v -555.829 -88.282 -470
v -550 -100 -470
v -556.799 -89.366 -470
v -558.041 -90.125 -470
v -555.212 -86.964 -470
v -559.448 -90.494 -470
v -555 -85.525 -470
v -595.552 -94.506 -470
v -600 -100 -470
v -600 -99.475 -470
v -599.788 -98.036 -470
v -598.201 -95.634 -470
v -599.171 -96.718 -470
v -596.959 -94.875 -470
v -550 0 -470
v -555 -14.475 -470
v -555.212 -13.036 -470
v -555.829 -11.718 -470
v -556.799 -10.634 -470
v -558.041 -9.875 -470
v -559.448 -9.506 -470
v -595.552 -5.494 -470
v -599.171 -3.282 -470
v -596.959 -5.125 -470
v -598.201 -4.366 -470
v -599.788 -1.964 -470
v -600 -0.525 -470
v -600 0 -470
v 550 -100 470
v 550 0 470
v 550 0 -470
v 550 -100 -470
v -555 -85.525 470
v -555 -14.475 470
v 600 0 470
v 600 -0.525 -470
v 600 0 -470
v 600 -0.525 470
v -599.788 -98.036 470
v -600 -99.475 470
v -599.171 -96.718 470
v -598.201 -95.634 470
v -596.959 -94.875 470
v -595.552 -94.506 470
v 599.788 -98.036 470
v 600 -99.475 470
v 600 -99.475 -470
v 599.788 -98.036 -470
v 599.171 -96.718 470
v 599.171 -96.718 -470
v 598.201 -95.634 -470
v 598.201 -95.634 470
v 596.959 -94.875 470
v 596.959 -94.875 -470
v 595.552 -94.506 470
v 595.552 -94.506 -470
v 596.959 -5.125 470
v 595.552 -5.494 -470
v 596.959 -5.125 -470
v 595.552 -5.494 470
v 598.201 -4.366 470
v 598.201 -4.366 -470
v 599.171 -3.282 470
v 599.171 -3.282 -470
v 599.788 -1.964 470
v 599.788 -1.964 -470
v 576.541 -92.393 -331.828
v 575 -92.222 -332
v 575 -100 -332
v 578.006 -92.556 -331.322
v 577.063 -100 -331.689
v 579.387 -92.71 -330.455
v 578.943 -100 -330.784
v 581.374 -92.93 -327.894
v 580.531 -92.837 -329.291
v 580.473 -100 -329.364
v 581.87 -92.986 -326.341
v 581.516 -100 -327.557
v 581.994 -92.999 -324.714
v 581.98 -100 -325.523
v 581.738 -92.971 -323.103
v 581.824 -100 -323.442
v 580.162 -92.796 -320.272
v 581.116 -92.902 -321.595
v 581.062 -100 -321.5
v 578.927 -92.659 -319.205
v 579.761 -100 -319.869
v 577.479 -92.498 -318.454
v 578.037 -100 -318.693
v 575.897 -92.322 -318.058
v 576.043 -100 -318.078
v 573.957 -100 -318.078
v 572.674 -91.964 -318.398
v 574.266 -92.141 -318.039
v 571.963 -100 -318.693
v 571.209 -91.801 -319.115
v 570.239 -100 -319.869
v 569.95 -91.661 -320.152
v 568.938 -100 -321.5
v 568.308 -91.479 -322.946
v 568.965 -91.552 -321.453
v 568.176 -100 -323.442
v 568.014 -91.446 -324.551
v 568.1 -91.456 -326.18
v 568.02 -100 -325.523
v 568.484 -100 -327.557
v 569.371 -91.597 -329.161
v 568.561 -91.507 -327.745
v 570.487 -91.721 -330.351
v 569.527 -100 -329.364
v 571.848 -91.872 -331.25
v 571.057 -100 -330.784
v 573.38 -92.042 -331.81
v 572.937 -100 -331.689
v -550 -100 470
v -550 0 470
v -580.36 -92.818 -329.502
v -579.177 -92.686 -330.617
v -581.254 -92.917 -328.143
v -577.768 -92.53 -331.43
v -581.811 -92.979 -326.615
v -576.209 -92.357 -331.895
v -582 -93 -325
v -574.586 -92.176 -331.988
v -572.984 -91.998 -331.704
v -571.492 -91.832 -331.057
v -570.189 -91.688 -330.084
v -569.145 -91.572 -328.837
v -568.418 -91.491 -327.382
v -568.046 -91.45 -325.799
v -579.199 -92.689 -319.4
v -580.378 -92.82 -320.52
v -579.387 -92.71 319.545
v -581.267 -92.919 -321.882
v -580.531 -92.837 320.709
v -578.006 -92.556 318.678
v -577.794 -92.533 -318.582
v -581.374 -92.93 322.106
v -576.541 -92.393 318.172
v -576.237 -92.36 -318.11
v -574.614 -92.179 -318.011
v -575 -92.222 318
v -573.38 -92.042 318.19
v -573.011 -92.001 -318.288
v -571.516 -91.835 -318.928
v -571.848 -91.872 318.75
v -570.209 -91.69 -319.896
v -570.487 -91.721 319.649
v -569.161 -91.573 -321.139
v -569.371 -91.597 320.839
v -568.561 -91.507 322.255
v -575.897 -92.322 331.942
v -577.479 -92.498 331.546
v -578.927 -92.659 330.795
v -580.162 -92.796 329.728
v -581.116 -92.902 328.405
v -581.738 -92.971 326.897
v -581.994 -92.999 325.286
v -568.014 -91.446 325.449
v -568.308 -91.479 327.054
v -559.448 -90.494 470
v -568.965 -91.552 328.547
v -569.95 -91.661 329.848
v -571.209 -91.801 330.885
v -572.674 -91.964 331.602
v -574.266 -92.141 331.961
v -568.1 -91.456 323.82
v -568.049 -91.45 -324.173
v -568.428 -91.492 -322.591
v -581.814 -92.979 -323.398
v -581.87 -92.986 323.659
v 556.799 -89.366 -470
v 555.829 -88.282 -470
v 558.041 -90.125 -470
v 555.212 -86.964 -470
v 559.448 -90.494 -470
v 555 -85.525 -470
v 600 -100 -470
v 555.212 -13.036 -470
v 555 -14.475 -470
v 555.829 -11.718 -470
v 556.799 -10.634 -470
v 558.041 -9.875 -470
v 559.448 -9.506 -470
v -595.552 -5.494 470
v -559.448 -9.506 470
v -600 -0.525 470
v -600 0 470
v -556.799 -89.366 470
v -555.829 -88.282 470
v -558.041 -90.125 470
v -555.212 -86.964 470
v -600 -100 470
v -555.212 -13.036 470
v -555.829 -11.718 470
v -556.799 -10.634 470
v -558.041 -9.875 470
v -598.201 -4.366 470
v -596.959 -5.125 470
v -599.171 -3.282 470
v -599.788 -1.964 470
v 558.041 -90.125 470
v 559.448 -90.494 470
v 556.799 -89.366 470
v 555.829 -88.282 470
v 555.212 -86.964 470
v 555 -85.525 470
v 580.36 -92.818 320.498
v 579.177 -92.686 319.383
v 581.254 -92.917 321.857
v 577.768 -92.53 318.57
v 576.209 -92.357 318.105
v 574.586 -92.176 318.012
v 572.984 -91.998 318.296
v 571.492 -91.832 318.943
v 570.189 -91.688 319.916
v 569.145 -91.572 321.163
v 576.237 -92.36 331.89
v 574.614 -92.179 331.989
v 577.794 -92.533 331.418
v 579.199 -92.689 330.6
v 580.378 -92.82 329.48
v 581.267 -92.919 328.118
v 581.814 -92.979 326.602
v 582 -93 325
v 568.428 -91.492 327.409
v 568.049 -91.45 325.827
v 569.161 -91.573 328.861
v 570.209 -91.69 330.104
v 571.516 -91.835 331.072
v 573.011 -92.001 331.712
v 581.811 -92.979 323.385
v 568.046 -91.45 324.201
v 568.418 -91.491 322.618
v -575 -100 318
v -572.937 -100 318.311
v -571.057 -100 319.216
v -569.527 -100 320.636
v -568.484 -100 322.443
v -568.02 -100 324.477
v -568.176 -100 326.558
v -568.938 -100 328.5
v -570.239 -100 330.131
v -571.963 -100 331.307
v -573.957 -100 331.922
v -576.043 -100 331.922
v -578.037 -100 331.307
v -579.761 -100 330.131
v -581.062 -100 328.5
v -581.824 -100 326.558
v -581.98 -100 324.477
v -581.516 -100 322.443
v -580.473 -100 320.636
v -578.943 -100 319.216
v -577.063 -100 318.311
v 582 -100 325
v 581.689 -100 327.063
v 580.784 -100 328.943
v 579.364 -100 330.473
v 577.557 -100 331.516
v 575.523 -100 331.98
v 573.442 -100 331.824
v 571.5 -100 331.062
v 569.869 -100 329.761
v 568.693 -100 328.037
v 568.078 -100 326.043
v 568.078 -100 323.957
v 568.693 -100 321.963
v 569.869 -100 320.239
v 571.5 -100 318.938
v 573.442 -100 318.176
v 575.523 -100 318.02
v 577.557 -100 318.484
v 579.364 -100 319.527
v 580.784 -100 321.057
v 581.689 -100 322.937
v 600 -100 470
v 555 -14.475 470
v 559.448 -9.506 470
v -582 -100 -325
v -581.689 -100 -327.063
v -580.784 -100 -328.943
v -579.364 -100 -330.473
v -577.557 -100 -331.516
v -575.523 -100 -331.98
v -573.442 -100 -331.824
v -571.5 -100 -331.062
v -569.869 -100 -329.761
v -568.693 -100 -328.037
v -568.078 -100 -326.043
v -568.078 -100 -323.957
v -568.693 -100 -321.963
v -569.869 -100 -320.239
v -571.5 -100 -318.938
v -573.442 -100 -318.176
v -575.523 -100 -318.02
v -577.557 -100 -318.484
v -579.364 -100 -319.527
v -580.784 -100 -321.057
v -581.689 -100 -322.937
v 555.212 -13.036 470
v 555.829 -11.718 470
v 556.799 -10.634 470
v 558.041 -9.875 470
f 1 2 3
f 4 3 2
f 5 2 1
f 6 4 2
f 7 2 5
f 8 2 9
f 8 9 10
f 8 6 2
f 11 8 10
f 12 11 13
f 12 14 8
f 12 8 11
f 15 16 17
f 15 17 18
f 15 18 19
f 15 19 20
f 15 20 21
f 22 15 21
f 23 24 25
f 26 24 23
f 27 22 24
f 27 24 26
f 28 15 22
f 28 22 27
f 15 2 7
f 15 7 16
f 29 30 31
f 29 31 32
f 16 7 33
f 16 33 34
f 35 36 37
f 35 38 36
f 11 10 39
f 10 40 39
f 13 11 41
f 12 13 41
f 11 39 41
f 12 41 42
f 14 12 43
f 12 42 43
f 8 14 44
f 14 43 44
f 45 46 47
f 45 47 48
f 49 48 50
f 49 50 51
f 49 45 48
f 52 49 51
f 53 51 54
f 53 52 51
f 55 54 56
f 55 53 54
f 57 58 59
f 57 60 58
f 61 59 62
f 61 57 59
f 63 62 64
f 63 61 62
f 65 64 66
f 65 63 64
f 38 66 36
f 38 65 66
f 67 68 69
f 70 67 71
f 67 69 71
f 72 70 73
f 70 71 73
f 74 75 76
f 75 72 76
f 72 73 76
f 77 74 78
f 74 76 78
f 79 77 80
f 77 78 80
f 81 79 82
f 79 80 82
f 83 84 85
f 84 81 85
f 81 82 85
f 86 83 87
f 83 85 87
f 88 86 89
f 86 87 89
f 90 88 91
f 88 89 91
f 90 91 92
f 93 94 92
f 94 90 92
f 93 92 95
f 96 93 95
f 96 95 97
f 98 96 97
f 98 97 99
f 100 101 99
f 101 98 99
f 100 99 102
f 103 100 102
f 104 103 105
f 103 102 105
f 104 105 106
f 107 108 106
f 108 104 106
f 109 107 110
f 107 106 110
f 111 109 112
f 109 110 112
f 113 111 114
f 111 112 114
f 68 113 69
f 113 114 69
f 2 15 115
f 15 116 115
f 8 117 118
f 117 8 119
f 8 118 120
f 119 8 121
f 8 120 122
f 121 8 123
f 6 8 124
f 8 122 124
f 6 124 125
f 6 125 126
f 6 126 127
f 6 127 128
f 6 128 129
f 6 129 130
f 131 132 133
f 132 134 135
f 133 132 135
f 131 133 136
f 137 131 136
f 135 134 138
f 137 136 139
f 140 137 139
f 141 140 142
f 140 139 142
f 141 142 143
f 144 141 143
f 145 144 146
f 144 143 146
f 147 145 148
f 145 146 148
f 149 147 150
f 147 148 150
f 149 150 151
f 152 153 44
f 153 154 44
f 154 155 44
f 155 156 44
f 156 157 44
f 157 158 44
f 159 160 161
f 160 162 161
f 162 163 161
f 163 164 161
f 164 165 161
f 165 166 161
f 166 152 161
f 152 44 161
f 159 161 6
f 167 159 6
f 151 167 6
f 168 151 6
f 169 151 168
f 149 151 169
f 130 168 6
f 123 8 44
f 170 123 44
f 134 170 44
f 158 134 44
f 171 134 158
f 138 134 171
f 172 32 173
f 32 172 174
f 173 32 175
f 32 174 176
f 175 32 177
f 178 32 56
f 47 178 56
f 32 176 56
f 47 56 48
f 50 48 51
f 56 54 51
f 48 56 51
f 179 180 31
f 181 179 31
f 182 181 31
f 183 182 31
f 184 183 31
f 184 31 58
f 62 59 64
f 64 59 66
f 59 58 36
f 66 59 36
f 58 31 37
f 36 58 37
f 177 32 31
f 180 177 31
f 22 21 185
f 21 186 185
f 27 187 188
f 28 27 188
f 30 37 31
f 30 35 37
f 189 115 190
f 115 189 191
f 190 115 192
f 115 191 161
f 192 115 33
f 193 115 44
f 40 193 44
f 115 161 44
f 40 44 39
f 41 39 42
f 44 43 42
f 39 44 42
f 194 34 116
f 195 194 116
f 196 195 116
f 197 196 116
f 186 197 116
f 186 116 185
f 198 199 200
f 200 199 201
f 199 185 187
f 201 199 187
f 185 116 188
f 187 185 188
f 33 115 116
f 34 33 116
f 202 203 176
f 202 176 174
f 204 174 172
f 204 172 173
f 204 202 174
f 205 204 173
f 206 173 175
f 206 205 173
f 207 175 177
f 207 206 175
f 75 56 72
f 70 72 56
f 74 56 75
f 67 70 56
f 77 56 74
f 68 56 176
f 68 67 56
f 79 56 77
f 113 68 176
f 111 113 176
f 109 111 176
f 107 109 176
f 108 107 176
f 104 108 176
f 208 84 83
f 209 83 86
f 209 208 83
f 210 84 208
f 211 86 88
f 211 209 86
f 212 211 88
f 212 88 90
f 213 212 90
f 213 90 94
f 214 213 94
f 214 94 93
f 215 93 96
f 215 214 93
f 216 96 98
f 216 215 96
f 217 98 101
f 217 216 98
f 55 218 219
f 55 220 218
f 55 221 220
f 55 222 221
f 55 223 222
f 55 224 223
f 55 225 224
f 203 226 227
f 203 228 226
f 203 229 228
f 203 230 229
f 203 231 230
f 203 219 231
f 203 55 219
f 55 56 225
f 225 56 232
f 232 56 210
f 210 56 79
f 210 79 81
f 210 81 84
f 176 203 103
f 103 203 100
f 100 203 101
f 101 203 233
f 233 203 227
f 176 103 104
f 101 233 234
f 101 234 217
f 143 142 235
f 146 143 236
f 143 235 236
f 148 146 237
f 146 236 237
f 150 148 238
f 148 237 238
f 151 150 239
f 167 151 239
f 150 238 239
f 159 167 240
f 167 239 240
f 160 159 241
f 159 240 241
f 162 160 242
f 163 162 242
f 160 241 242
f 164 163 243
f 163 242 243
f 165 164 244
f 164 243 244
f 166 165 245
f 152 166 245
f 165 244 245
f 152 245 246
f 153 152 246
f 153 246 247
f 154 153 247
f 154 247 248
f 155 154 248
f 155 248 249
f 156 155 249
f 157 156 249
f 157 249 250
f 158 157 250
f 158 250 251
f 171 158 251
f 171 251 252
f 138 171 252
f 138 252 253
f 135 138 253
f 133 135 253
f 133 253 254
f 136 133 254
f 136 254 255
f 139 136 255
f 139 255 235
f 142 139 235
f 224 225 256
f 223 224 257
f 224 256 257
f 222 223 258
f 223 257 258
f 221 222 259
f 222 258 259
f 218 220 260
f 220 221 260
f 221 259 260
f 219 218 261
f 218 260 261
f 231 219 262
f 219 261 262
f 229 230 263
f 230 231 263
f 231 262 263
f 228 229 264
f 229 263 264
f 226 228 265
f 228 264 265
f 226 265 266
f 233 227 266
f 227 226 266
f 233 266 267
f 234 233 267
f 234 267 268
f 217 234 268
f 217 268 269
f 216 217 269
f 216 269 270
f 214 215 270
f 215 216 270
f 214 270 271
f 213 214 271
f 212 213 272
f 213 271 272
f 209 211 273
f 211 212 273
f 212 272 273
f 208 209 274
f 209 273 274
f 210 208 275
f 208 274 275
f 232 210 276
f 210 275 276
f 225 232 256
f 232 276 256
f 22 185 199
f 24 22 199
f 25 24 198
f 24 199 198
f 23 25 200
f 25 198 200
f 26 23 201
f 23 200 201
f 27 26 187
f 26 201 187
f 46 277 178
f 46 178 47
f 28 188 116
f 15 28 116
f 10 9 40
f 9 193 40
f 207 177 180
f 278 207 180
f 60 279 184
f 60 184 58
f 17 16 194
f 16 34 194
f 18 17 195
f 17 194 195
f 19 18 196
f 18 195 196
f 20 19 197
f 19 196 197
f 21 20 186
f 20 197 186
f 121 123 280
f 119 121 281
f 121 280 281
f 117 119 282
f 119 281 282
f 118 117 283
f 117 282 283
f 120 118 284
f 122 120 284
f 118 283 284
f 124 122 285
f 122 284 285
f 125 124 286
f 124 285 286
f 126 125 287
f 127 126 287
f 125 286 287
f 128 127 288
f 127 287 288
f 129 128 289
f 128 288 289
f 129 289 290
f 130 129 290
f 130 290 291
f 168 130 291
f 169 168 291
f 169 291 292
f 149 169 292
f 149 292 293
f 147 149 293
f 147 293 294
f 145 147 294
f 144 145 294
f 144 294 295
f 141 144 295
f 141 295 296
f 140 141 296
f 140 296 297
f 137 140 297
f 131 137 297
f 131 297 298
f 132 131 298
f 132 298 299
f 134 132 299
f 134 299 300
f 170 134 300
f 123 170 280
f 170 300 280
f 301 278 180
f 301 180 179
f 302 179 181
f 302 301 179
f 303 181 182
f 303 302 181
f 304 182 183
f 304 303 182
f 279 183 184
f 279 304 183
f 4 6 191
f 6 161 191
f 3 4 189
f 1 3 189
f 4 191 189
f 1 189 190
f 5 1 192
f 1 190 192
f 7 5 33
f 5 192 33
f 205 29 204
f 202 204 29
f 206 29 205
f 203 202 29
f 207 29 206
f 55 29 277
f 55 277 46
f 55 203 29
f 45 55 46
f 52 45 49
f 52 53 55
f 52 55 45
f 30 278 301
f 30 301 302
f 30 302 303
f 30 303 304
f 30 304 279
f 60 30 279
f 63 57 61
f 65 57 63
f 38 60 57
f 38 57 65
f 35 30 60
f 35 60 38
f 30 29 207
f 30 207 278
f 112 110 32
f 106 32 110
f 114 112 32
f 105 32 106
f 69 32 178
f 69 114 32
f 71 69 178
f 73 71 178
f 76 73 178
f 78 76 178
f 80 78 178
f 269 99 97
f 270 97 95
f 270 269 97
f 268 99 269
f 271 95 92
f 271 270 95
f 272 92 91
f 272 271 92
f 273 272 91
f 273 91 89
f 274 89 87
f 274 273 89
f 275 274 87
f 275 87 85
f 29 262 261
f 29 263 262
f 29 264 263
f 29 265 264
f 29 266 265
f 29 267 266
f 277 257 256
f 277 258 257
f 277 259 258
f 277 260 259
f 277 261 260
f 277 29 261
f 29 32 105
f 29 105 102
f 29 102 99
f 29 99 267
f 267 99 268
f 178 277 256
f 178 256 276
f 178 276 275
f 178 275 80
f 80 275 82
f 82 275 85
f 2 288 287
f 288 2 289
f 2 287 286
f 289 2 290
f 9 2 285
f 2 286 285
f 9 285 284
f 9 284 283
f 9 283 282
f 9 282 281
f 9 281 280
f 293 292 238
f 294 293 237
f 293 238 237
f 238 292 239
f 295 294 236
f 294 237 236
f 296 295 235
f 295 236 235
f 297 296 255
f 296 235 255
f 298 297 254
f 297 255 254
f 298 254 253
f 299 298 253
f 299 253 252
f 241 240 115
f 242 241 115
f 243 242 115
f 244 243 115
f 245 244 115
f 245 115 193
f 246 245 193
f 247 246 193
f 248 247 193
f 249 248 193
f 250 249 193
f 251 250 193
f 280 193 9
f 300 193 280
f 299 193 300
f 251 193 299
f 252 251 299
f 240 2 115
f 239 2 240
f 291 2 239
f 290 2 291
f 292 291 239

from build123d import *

# Parameters (mm, degrees)
BOSS_EXTRUDE1_DEPTH   = 470
BOSS_EXTRUDE1_2_DEPTH = 470
SKETCH2_R             = 7
CUT_EXTRUDE1_DEPTH    = 10


with BuildPart() as part:
    # Sketch1 → Boss-Extrude1 (new, symmetric)
    with BuildSketch(Plane.XY):
        with BuildLine():
            Line((-600, 0), (-550, 0))
            Line((-550, 0), (-550, -100))
            Line((-550, -100), (-600, -100))
            Line((-600, -100), (-600, -99.475213966))
            ThreePointArc((-600, -99.475213966), (-598.725640089, -96.140606654), (-595.55215763, -94.505795292))
            Line((-595.55215763, -94.505795292), (-559.44784237, -90.494204708))
            ThreePointArc((-559.44784237, -90.494204708), (-556.274359911, -88.859393346), (-555, -85.524786034))
            Line((-555, -85.524786034), (-555, -14.475213966))
            ThreePointArc((-555, -14.475213966), (-556.274359911, -11.140606654), (-559.44784237, -9.505795292))
            Line((-559.44784237, -9.505795292), (-595.55215763, -5.494204708))
            ThreePointArc((-595.55215763, -5.494204708), (-598.725640089, -3.859393346), (-600, -0.524786034))
            Line((-600, -0.524786034), (-600, 0))
        make_face()
    extrude(amount=BOSS_EXTRUDE1_DEPTH, both=True)


with BuildPart() as body_2:
    # Sketch1 → Boss-Extrude1 2 (new, symmetric)
    with BuildSketch(Plane.XY):
        with BuildLine():
            Line((600, 0), (550, 0))
            Line((550, 0), (550, -100))
            Line((550, -100), (600, -100))
            Line((600, -100), (600, -99.475213966))
            ThreePointArc((600, -99.475213966), (598.725640089, -96.140606654), (595.55215763, -94.505795292))
            Line((595.55215763, -94.505795292), (559.44784237, -90.494204708))
            ThreePointArc((559.44784237, -90.494204708), (556.274359911, -88.859393346), (555, -85.524786034))
            Line((555, -85.524786034), (555, -14.475213966))
            ThreePointArc((555, -14.475213966), (556.274359911, -11.140606654), (559.44784237, -9.505795292))
            Line((559.44784237, -9.505795292), (595.55215763, -5.494204708))
            ThreePointArc((595.55215763, -5.494204708), (598.725640089, -3.859393346), (600, -0.524786034))
            Line((600, -0.524786034), (600, 0))
        make_face()
    extrude(amount=BOSS_EXTRUDE1_2_DEPTH, both=True)


with BuildPart() as cut_extrude1_tool:
    # Sketch2 → Cut-Extrude1 (new body)
    with BuildSketch(Plane.XZ.offset(100)):
        with Locations(Location((-575, 325, 0), (0, 0, 270))):
            Circle(SKETCH2_R)
        with Locations(Location((-575, -325, 0), (0, 0, 180))):
            Circle(SKETCH2_R)
        with Locations(Location((575, -325, 0), (0, 0, 270))):
            Circle(SKETCH2_R)
        with Locations((575, 325)):
            Circle(SKETCH2_R)
    extrude(amount=-CUT_EXTRUDE1_DEPTH)


with BuildPart() as part_1:
    add(part.part)

    # Cut-Extrude1: cut by cut_extrude1_tool
    add(cut_extrude1_tool.part, mode=Mode.SUBTRACT)


with BuildPart() as body_2_1:
    add(body_2.part)

    # Cut-Extrude1: cut by cut_extrude1_tool
    add(cut_extrude1_tool.part, mode=Mode.SUBTRACT)


solid = Compound([part_1.part, body_2_1.part])
